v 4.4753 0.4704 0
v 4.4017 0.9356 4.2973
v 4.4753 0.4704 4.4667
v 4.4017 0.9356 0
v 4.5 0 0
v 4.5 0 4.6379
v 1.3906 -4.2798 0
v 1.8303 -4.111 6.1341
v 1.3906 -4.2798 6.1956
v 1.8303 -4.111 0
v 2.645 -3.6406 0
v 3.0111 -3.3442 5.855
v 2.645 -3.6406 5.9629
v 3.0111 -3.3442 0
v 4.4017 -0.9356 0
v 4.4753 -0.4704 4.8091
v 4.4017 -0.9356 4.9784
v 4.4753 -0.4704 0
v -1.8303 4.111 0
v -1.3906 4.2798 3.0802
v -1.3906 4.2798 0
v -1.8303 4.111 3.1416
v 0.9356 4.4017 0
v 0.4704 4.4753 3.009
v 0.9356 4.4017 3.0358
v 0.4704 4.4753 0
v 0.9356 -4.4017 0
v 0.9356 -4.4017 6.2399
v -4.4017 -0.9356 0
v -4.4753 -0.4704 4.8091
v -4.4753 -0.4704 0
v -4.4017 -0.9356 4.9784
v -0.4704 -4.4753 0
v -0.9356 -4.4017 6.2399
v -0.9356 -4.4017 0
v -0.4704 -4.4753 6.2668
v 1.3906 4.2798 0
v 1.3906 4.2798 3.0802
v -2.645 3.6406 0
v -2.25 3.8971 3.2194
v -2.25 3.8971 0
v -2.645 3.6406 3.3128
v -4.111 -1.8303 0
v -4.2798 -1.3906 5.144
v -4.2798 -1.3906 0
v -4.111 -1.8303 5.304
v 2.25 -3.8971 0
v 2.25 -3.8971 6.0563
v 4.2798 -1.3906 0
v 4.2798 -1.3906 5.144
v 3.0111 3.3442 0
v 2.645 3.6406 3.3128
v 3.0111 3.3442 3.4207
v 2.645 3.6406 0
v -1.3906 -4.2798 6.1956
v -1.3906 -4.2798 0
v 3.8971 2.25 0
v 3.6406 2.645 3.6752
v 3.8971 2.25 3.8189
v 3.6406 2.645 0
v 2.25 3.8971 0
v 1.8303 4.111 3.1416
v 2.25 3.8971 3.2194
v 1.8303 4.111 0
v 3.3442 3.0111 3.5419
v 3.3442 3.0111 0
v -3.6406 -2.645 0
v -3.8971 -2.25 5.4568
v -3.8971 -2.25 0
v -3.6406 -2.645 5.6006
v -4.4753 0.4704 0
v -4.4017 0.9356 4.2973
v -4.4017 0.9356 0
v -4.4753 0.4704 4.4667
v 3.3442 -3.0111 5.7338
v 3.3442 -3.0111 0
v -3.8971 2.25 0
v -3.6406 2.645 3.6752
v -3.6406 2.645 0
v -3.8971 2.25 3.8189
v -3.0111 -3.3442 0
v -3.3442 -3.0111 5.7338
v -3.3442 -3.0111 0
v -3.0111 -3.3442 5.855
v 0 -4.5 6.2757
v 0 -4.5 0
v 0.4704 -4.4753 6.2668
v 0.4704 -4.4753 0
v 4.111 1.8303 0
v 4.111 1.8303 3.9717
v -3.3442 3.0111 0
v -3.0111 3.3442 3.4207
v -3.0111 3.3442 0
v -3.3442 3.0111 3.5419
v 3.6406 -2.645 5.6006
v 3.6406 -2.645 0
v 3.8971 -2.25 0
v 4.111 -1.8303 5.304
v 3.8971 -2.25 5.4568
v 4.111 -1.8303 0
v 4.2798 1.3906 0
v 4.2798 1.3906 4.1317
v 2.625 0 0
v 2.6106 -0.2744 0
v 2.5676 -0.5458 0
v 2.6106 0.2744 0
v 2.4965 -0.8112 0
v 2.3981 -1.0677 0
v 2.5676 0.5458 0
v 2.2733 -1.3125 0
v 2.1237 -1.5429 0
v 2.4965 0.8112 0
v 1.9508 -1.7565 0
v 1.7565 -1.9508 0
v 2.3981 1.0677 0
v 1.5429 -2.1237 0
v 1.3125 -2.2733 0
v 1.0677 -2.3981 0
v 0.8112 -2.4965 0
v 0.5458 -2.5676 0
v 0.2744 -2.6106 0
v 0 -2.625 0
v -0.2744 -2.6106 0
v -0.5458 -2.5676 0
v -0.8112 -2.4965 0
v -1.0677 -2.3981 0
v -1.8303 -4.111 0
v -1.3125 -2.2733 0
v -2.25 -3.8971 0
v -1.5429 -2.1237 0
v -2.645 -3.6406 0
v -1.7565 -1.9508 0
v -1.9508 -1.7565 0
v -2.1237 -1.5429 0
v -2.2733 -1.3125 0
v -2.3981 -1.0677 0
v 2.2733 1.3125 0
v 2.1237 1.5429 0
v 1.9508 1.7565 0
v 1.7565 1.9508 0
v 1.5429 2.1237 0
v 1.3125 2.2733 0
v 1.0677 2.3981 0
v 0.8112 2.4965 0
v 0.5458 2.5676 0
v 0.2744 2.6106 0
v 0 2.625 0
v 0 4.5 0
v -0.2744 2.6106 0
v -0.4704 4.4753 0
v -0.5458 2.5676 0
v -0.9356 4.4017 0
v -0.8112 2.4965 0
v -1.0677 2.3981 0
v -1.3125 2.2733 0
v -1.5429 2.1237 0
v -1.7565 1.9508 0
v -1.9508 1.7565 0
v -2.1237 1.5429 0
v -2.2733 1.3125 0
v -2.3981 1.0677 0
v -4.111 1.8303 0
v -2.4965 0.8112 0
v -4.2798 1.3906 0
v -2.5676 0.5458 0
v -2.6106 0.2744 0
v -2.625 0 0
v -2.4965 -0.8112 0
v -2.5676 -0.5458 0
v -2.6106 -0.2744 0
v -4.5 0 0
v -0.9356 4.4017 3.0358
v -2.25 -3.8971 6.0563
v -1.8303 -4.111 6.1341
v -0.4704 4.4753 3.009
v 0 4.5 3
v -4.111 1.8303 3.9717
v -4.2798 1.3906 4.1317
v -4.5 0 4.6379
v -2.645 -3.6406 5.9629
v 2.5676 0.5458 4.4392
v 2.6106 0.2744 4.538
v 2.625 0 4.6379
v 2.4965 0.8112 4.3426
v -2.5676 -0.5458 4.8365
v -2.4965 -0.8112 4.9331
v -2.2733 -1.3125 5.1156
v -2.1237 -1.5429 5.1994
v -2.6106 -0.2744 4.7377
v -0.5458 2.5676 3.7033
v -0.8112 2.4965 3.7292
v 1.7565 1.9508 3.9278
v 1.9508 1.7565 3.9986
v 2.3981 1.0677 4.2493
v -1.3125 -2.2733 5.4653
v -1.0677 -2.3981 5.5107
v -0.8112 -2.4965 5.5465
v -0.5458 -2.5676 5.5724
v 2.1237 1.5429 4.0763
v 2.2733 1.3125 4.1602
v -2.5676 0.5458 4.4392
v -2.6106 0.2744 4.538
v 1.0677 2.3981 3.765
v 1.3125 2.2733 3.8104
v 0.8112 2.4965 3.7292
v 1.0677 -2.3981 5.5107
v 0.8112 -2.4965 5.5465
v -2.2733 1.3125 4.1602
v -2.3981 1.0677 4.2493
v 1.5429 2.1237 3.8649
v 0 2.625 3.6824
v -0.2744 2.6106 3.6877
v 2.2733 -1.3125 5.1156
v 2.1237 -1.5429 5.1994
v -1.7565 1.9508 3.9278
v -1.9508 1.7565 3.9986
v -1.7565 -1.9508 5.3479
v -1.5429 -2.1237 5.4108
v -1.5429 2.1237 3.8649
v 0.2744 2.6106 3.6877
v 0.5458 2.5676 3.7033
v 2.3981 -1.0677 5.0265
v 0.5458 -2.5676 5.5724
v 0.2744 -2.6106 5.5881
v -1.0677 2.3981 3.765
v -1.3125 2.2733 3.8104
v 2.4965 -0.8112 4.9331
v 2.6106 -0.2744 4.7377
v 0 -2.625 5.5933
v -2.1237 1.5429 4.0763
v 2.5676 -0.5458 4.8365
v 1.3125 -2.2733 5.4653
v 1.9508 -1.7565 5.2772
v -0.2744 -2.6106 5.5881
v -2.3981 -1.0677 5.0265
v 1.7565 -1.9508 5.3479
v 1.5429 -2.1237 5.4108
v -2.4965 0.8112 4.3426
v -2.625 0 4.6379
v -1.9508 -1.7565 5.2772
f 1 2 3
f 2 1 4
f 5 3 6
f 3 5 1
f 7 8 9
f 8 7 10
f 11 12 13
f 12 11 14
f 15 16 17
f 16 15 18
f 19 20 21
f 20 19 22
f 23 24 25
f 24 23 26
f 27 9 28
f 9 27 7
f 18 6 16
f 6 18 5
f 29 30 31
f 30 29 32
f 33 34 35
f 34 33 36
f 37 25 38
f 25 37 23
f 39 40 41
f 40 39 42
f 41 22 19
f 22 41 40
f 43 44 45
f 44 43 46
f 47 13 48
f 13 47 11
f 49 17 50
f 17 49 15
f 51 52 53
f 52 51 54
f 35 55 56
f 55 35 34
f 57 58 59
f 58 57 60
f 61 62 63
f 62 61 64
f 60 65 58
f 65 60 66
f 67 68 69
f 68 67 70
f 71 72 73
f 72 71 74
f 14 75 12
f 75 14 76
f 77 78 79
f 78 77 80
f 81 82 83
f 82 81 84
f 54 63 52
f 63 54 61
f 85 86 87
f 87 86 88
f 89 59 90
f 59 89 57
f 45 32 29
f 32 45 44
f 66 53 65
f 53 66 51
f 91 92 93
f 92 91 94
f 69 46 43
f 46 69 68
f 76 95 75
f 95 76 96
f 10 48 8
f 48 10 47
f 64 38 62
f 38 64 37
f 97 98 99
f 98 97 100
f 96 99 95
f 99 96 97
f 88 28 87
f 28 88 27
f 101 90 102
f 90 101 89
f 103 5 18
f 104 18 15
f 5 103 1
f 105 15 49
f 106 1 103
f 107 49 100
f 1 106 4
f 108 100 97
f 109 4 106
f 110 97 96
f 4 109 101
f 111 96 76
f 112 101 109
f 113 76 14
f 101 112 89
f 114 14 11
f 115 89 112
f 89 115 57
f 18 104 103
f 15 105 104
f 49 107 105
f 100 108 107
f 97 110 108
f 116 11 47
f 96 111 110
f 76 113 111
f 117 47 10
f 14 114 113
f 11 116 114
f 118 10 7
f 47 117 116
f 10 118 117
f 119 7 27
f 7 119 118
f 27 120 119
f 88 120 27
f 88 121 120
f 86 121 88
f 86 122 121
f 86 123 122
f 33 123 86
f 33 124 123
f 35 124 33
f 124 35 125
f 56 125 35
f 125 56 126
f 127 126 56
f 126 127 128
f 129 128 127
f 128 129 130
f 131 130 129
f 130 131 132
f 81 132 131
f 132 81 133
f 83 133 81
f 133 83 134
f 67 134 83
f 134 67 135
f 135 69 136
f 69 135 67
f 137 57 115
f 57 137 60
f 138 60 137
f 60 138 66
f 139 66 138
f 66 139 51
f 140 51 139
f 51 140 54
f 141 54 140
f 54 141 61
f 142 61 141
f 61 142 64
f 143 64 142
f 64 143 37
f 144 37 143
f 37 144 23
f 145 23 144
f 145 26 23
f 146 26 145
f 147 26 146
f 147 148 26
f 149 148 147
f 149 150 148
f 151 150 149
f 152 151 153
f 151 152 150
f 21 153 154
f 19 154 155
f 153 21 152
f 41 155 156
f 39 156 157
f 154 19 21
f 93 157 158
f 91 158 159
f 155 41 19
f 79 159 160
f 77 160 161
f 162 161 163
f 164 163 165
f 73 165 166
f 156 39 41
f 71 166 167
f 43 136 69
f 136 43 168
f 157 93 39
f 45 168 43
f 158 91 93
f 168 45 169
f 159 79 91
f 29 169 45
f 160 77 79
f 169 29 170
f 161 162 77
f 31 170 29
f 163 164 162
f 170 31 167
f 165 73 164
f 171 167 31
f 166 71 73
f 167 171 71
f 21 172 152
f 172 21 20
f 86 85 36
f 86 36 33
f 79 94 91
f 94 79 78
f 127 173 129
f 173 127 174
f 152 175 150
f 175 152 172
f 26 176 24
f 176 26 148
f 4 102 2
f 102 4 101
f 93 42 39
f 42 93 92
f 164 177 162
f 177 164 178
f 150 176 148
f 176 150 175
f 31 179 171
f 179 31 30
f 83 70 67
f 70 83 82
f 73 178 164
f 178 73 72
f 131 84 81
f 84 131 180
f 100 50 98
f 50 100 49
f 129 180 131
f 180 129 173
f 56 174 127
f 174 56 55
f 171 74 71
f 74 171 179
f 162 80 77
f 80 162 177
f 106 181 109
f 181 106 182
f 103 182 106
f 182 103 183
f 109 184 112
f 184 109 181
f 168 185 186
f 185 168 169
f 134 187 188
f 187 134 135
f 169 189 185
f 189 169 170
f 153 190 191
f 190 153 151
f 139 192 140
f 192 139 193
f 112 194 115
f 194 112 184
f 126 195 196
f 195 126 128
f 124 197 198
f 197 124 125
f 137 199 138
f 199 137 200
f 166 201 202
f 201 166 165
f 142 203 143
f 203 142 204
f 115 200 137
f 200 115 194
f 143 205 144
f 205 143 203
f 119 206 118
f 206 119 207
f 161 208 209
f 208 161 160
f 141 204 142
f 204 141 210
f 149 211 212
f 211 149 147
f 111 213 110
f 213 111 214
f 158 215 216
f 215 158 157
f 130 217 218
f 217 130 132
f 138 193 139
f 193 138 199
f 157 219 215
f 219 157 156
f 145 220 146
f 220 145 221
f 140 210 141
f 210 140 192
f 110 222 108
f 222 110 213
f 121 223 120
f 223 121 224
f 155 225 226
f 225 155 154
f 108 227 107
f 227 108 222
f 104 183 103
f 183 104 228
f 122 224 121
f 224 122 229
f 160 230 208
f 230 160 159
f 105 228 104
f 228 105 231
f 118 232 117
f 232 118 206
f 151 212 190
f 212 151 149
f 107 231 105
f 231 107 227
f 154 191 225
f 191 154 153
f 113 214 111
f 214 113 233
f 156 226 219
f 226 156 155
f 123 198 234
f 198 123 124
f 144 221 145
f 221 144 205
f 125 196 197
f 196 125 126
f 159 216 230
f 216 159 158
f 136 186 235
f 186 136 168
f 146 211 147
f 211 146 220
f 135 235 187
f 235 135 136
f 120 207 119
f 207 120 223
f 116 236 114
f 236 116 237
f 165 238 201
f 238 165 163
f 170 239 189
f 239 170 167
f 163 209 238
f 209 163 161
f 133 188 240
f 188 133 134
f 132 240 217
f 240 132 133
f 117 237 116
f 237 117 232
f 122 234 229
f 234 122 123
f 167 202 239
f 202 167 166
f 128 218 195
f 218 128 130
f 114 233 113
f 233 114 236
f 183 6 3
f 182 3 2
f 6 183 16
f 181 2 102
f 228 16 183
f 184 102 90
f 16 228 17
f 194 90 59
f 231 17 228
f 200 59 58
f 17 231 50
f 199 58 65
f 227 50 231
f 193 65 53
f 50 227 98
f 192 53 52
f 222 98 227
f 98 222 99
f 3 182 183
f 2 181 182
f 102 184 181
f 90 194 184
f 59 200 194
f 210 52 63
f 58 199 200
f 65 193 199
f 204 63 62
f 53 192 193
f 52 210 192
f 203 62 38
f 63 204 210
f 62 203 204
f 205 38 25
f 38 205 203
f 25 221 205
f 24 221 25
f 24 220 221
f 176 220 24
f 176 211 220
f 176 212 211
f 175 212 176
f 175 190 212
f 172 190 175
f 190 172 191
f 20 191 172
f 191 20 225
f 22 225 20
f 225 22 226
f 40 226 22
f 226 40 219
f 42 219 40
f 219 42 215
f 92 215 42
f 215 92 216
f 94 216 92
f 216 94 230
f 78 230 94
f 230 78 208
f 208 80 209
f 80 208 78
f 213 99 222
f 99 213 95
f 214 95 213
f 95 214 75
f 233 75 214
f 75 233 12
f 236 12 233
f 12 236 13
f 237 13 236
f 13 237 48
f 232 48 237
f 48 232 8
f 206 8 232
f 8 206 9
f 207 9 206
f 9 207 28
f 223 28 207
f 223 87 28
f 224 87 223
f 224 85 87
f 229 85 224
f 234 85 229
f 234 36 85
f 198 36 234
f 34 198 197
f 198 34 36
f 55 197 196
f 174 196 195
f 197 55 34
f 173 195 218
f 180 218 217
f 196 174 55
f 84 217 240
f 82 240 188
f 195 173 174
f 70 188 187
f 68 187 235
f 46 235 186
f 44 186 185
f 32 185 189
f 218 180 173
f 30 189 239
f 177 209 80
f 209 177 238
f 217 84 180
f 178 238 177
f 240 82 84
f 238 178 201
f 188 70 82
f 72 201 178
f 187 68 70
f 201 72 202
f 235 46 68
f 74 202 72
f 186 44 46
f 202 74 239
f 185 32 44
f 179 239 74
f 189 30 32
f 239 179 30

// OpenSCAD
tolerance = 0.25;
// diameter
inner = 5 + tolerance;
// diameter
outer = 9;
angle = 20;
thickness = 3;

module washer (inner, outer, thickness, angle) {

    allthick = thickness + outer*tan(angle);
    
    difference() {
        cylinder(d=outer, h=allthick, $fn=60);
        translate([0,0,-allthick])
        cylinder(d=inner, h=allthick*3, $fn=60);
        
        translate([-outer/2, outer/2, thickness]) rotate([90-angle, 0, 0]) 
        cube(outer*outer, outer*outer, outer*outer);
    };
}

// dimensions in mm
washer (inner, outer, thickness, angle);
